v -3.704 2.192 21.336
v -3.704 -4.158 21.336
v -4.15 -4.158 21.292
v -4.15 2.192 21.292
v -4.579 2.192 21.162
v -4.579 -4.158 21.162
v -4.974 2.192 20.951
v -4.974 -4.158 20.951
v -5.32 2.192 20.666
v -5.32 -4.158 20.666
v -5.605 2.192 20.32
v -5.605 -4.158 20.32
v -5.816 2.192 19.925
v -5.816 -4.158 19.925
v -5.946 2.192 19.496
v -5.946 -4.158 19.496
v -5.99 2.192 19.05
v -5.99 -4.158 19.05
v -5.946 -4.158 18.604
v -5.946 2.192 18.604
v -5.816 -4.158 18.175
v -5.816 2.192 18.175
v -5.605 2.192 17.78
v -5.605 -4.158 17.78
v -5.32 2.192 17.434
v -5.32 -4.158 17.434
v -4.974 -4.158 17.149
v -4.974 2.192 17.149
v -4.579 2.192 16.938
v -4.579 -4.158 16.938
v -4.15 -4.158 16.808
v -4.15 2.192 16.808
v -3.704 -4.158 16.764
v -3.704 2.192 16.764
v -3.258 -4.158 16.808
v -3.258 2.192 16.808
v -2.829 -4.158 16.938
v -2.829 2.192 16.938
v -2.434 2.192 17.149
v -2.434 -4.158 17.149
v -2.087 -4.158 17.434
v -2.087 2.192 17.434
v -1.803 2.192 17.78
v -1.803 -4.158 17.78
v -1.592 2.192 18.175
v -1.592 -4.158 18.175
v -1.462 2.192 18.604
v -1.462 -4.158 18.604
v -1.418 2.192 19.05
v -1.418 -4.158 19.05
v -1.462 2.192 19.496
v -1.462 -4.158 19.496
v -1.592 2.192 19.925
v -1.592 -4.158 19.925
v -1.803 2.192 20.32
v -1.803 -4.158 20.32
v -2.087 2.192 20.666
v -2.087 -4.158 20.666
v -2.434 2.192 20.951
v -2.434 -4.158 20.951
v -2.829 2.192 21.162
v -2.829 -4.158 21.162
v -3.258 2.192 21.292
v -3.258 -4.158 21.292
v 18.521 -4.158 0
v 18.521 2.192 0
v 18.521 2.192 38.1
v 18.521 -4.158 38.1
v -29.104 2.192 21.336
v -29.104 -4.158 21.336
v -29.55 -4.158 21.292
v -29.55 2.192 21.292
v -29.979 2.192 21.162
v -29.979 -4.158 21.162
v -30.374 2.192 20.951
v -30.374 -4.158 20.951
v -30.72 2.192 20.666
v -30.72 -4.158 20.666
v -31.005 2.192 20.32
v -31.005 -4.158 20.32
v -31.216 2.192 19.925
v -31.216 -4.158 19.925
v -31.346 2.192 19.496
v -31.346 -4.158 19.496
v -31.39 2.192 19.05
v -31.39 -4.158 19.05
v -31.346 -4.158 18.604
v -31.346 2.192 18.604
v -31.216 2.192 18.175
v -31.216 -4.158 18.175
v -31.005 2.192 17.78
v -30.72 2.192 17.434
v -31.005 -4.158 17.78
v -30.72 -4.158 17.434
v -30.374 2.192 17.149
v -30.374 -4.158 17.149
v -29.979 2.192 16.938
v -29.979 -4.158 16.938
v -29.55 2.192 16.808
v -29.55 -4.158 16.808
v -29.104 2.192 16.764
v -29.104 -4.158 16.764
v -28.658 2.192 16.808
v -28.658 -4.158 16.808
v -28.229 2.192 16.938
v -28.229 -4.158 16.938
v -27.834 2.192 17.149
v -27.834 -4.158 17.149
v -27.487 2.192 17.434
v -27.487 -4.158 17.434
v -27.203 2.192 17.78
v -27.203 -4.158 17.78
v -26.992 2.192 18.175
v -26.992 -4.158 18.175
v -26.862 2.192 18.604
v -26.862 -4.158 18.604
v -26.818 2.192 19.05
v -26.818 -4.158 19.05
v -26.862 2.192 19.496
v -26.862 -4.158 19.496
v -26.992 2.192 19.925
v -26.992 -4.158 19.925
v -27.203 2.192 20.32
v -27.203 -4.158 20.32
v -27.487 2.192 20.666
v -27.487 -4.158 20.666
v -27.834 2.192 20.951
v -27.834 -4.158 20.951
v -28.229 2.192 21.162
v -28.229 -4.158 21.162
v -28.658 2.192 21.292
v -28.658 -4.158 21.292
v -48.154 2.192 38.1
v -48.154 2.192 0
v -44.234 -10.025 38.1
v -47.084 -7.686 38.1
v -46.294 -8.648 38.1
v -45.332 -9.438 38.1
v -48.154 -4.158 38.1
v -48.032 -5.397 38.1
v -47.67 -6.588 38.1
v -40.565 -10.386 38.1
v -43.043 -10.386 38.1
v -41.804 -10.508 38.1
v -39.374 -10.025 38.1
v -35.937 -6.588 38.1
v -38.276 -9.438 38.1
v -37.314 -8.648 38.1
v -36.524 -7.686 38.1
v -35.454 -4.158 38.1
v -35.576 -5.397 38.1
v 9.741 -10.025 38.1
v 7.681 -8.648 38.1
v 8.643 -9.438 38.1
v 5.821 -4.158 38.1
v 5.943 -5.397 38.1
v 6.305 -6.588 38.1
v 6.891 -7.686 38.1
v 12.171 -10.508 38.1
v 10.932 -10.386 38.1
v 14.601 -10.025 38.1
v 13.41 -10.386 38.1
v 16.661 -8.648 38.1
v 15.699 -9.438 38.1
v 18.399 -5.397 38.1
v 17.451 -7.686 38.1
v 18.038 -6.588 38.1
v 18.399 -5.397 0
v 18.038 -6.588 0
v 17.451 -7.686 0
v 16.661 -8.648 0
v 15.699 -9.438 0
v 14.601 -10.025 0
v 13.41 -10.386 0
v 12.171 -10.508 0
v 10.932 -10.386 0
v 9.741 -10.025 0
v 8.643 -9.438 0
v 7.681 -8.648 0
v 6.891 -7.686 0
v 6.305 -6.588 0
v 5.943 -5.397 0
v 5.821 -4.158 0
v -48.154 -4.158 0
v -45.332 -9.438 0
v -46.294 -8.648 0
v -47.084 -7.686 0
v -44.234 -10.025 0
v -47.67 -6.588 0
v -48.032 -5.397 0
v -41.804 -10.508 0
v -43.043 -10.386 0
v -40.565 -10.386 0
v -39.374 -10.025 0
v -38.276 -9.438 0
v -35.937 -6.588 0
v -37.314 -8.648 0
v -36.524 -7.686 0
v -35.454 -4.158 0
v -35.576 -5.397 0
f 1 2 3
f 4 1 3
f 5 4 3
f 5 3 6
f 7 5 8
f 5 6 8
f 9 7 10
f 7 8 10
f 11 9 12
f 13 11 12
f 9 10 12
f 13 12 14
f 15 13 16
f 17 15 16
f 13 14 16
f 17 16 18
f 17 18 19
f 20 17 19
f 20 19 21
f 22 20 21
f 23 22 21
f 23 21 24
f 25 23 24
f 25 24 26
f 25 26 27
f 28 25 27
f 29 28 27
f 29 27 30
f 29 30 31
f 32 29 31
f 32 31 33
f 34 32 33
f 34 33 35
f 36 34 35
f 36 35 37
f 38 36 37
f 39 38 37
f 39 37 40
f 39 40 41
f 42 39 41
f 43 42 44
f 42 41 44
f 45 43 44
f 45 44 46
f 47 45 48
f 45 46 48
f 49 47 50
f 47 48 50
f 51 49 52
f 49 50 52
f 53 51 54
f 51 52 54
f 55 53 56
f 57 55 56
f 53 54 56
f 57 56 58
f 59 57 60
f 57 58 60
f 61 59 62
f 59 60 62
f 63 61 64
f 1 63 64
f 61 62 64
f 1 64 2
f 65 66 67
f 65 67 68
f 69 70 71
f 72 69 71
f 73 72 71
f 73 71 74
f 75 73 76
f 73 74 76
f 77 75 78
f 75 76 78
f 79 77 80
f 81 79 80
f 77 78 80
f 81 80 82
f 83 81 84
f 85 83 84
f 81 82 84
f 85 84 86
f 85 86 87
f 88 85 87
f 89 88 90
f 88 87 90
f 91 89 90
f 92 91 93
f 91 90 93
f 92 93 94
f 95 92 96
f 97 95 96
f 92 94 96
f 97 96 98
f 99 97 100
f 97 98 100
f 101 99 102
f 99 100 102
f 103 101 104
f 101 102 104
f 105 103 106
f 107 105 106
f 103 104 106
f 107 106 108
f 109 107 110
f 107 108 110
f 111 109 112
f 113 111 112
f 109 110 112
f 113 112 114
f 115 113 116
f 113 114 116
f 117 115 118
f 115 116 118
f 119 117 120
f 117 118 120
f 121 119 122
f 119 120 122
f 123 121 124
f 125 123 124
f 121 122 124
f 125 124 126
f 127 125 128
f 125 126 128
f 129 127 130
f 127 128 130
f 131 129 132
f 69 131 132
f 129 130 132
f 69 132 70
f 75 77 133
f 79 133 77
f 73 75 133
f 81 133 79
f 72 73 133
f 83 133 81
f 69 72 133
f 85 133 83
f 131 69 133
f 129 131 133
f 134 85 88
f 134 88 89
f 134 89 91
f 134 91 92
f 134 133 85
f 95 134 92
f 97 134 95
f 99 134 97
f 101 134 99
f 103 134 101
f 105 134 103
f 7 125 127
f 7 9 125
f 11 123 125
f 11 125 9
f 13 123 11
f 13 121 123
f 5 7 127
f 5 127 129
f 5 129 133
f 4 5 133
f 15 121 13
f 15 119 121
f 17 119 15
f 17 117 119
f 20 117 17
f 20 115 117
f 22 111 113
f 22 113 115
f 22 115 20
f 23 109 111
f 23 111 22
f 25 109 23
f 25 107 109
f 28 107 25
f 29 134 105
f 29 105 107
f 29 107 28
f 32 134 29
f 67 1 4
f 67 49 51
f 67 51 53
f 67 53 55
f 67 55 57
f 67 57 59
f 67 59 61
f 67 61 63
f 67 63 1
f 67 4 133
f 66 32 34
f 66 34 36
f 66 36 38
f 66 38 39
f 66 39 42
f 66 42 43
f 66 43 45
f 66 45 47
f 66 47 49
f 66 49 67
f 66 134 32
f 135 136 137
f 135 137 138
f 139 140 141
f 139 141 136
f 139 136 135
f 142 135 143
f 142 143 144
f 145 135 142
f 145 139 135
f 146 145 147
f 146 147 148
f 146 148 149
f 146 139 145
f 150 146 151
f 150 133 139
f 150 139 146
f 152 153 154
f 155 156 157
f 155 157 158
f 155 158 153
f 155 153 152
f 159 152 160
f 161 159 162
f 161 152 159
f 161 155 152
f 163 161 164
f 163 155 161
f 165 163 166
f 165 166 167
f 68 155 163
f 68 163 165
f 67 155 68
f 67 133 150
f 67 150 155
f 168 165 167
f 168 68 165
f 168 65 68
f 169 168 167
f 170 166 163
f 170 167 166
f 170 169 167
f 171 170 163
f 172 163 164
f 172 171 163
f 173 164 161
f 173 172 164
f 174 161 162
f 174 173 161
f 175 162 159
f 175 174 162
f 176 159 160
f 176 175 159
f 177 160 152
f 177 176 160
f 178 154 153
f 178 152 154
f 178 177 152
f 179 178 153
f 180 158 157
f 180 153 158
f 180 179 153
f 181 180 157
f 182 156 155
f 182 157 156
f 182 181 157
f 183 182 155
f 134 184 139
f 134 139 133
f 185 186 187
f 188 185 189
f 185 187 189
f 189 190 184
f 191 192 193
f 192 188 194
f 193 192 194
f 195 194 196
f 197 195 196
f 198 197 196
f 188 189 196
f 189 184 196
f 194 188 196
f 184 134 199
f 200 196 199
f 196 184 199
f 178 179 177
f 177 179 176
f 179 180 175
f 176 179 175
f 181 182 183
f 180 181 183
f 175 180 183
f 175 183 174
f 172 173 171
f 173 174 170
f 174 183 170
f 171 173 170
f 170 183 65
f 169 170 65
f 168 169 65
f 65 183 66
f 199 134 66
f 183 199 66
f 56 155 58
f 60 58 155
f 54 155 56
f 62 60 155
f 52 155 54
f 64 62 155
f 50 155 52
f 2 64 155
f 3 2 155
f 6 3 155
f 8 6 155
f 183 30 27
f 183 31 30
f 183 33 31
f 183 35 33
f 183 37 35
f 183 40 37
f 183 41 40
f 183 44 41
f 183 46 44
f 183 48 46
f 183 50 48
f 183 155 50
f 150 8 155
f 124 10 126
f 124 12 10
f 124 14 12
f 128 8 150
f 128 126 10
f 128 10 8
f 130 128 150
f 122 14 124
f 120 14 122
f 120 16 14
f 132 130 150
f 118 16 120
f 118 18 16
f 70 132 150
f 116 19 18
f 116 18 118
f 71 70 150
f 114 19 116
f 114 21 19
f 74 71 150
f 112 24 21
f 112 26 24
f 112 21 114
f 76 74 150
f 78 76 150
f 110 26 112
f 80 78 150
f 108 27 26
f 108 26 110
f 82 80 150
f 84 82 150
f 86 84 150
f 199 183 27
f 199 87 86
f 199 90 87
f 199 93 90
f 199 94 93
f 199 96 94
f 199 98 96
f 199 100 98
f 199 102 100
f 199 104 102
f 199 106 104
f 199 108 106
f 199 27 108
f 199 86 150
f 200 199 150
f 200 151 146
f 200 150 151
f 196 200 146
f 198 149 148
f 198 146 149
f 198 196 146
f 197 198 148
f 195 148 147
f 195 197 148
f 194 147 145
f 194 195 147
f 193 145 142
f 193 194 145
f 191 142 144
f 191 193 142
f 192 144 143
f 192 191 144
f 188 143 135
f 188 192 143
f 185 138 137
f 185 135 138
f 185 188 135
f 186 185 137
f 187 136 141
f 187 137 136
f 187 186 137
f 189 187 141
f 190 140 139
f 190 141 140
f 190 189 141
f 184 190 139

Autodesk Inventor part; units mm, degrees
ref_plane "YZ Plane" through (0, 0, 0) normal (1, 0, 0) x (0, 1, 0)
ref_plane "XZ Plane" through (0, 0, 0) normal (0, 1, 0) x (-1, 0, 0)
ref_plane "XY Plane" through (0, 0, 0) normal (0, 0, 1) x (1, 0, 0)
sketch "Sketch1" plane through (0, 0, 0) normal (0, 0, 1) x (1, 0, 0)
  line L0 (-48.1538, -4.158) -> (-48.1538, 2.192)
  line L1 (-48.1538, 2.192) -> (18.5212, 2.192)
  line L2 (18.5212, 2.192) -> (18.5212, -4.158)
  arc A0 (5.8212, -4.158) -> (18.5212, -4.158) centre (12.1712, -4.158) ccw
  line L3 (5.8212, -4.158) -> (-35.4538, -4.158)
  arc A1 (-48.1538, -4.158) -> (-35.4538, -4.158) centre (-41.8038, -4.158) ccw
  dimension "d0" = 6.35
  dimension "d1" = 6.35
  dimension "d2" = 66.675
extrude "Extrusion1" add sketch "Sketch1" along normal blind 38.1
sketch "Sketch2" plane through (-48.1538, 2.192, 0) normal (0, 1, 0) x (1, 0, 0)
  line L0 (0, 0) -> (0, -38.1) projected
  line L1 (19.05, -19.05) -> (44.45, -19.05)
  point P0 (66.675, 0)
  dimension "d5" = 22.225
  dimension "d6" = 25.4
  dimension "d7" = 19.05
hole "Hole1" at (-3.7038, 2.192, 19.05) at (-29.1038, 2.192, 19.05) direction (0, -1, 0) diameter 4.572 end through all
properties part number "locator"
